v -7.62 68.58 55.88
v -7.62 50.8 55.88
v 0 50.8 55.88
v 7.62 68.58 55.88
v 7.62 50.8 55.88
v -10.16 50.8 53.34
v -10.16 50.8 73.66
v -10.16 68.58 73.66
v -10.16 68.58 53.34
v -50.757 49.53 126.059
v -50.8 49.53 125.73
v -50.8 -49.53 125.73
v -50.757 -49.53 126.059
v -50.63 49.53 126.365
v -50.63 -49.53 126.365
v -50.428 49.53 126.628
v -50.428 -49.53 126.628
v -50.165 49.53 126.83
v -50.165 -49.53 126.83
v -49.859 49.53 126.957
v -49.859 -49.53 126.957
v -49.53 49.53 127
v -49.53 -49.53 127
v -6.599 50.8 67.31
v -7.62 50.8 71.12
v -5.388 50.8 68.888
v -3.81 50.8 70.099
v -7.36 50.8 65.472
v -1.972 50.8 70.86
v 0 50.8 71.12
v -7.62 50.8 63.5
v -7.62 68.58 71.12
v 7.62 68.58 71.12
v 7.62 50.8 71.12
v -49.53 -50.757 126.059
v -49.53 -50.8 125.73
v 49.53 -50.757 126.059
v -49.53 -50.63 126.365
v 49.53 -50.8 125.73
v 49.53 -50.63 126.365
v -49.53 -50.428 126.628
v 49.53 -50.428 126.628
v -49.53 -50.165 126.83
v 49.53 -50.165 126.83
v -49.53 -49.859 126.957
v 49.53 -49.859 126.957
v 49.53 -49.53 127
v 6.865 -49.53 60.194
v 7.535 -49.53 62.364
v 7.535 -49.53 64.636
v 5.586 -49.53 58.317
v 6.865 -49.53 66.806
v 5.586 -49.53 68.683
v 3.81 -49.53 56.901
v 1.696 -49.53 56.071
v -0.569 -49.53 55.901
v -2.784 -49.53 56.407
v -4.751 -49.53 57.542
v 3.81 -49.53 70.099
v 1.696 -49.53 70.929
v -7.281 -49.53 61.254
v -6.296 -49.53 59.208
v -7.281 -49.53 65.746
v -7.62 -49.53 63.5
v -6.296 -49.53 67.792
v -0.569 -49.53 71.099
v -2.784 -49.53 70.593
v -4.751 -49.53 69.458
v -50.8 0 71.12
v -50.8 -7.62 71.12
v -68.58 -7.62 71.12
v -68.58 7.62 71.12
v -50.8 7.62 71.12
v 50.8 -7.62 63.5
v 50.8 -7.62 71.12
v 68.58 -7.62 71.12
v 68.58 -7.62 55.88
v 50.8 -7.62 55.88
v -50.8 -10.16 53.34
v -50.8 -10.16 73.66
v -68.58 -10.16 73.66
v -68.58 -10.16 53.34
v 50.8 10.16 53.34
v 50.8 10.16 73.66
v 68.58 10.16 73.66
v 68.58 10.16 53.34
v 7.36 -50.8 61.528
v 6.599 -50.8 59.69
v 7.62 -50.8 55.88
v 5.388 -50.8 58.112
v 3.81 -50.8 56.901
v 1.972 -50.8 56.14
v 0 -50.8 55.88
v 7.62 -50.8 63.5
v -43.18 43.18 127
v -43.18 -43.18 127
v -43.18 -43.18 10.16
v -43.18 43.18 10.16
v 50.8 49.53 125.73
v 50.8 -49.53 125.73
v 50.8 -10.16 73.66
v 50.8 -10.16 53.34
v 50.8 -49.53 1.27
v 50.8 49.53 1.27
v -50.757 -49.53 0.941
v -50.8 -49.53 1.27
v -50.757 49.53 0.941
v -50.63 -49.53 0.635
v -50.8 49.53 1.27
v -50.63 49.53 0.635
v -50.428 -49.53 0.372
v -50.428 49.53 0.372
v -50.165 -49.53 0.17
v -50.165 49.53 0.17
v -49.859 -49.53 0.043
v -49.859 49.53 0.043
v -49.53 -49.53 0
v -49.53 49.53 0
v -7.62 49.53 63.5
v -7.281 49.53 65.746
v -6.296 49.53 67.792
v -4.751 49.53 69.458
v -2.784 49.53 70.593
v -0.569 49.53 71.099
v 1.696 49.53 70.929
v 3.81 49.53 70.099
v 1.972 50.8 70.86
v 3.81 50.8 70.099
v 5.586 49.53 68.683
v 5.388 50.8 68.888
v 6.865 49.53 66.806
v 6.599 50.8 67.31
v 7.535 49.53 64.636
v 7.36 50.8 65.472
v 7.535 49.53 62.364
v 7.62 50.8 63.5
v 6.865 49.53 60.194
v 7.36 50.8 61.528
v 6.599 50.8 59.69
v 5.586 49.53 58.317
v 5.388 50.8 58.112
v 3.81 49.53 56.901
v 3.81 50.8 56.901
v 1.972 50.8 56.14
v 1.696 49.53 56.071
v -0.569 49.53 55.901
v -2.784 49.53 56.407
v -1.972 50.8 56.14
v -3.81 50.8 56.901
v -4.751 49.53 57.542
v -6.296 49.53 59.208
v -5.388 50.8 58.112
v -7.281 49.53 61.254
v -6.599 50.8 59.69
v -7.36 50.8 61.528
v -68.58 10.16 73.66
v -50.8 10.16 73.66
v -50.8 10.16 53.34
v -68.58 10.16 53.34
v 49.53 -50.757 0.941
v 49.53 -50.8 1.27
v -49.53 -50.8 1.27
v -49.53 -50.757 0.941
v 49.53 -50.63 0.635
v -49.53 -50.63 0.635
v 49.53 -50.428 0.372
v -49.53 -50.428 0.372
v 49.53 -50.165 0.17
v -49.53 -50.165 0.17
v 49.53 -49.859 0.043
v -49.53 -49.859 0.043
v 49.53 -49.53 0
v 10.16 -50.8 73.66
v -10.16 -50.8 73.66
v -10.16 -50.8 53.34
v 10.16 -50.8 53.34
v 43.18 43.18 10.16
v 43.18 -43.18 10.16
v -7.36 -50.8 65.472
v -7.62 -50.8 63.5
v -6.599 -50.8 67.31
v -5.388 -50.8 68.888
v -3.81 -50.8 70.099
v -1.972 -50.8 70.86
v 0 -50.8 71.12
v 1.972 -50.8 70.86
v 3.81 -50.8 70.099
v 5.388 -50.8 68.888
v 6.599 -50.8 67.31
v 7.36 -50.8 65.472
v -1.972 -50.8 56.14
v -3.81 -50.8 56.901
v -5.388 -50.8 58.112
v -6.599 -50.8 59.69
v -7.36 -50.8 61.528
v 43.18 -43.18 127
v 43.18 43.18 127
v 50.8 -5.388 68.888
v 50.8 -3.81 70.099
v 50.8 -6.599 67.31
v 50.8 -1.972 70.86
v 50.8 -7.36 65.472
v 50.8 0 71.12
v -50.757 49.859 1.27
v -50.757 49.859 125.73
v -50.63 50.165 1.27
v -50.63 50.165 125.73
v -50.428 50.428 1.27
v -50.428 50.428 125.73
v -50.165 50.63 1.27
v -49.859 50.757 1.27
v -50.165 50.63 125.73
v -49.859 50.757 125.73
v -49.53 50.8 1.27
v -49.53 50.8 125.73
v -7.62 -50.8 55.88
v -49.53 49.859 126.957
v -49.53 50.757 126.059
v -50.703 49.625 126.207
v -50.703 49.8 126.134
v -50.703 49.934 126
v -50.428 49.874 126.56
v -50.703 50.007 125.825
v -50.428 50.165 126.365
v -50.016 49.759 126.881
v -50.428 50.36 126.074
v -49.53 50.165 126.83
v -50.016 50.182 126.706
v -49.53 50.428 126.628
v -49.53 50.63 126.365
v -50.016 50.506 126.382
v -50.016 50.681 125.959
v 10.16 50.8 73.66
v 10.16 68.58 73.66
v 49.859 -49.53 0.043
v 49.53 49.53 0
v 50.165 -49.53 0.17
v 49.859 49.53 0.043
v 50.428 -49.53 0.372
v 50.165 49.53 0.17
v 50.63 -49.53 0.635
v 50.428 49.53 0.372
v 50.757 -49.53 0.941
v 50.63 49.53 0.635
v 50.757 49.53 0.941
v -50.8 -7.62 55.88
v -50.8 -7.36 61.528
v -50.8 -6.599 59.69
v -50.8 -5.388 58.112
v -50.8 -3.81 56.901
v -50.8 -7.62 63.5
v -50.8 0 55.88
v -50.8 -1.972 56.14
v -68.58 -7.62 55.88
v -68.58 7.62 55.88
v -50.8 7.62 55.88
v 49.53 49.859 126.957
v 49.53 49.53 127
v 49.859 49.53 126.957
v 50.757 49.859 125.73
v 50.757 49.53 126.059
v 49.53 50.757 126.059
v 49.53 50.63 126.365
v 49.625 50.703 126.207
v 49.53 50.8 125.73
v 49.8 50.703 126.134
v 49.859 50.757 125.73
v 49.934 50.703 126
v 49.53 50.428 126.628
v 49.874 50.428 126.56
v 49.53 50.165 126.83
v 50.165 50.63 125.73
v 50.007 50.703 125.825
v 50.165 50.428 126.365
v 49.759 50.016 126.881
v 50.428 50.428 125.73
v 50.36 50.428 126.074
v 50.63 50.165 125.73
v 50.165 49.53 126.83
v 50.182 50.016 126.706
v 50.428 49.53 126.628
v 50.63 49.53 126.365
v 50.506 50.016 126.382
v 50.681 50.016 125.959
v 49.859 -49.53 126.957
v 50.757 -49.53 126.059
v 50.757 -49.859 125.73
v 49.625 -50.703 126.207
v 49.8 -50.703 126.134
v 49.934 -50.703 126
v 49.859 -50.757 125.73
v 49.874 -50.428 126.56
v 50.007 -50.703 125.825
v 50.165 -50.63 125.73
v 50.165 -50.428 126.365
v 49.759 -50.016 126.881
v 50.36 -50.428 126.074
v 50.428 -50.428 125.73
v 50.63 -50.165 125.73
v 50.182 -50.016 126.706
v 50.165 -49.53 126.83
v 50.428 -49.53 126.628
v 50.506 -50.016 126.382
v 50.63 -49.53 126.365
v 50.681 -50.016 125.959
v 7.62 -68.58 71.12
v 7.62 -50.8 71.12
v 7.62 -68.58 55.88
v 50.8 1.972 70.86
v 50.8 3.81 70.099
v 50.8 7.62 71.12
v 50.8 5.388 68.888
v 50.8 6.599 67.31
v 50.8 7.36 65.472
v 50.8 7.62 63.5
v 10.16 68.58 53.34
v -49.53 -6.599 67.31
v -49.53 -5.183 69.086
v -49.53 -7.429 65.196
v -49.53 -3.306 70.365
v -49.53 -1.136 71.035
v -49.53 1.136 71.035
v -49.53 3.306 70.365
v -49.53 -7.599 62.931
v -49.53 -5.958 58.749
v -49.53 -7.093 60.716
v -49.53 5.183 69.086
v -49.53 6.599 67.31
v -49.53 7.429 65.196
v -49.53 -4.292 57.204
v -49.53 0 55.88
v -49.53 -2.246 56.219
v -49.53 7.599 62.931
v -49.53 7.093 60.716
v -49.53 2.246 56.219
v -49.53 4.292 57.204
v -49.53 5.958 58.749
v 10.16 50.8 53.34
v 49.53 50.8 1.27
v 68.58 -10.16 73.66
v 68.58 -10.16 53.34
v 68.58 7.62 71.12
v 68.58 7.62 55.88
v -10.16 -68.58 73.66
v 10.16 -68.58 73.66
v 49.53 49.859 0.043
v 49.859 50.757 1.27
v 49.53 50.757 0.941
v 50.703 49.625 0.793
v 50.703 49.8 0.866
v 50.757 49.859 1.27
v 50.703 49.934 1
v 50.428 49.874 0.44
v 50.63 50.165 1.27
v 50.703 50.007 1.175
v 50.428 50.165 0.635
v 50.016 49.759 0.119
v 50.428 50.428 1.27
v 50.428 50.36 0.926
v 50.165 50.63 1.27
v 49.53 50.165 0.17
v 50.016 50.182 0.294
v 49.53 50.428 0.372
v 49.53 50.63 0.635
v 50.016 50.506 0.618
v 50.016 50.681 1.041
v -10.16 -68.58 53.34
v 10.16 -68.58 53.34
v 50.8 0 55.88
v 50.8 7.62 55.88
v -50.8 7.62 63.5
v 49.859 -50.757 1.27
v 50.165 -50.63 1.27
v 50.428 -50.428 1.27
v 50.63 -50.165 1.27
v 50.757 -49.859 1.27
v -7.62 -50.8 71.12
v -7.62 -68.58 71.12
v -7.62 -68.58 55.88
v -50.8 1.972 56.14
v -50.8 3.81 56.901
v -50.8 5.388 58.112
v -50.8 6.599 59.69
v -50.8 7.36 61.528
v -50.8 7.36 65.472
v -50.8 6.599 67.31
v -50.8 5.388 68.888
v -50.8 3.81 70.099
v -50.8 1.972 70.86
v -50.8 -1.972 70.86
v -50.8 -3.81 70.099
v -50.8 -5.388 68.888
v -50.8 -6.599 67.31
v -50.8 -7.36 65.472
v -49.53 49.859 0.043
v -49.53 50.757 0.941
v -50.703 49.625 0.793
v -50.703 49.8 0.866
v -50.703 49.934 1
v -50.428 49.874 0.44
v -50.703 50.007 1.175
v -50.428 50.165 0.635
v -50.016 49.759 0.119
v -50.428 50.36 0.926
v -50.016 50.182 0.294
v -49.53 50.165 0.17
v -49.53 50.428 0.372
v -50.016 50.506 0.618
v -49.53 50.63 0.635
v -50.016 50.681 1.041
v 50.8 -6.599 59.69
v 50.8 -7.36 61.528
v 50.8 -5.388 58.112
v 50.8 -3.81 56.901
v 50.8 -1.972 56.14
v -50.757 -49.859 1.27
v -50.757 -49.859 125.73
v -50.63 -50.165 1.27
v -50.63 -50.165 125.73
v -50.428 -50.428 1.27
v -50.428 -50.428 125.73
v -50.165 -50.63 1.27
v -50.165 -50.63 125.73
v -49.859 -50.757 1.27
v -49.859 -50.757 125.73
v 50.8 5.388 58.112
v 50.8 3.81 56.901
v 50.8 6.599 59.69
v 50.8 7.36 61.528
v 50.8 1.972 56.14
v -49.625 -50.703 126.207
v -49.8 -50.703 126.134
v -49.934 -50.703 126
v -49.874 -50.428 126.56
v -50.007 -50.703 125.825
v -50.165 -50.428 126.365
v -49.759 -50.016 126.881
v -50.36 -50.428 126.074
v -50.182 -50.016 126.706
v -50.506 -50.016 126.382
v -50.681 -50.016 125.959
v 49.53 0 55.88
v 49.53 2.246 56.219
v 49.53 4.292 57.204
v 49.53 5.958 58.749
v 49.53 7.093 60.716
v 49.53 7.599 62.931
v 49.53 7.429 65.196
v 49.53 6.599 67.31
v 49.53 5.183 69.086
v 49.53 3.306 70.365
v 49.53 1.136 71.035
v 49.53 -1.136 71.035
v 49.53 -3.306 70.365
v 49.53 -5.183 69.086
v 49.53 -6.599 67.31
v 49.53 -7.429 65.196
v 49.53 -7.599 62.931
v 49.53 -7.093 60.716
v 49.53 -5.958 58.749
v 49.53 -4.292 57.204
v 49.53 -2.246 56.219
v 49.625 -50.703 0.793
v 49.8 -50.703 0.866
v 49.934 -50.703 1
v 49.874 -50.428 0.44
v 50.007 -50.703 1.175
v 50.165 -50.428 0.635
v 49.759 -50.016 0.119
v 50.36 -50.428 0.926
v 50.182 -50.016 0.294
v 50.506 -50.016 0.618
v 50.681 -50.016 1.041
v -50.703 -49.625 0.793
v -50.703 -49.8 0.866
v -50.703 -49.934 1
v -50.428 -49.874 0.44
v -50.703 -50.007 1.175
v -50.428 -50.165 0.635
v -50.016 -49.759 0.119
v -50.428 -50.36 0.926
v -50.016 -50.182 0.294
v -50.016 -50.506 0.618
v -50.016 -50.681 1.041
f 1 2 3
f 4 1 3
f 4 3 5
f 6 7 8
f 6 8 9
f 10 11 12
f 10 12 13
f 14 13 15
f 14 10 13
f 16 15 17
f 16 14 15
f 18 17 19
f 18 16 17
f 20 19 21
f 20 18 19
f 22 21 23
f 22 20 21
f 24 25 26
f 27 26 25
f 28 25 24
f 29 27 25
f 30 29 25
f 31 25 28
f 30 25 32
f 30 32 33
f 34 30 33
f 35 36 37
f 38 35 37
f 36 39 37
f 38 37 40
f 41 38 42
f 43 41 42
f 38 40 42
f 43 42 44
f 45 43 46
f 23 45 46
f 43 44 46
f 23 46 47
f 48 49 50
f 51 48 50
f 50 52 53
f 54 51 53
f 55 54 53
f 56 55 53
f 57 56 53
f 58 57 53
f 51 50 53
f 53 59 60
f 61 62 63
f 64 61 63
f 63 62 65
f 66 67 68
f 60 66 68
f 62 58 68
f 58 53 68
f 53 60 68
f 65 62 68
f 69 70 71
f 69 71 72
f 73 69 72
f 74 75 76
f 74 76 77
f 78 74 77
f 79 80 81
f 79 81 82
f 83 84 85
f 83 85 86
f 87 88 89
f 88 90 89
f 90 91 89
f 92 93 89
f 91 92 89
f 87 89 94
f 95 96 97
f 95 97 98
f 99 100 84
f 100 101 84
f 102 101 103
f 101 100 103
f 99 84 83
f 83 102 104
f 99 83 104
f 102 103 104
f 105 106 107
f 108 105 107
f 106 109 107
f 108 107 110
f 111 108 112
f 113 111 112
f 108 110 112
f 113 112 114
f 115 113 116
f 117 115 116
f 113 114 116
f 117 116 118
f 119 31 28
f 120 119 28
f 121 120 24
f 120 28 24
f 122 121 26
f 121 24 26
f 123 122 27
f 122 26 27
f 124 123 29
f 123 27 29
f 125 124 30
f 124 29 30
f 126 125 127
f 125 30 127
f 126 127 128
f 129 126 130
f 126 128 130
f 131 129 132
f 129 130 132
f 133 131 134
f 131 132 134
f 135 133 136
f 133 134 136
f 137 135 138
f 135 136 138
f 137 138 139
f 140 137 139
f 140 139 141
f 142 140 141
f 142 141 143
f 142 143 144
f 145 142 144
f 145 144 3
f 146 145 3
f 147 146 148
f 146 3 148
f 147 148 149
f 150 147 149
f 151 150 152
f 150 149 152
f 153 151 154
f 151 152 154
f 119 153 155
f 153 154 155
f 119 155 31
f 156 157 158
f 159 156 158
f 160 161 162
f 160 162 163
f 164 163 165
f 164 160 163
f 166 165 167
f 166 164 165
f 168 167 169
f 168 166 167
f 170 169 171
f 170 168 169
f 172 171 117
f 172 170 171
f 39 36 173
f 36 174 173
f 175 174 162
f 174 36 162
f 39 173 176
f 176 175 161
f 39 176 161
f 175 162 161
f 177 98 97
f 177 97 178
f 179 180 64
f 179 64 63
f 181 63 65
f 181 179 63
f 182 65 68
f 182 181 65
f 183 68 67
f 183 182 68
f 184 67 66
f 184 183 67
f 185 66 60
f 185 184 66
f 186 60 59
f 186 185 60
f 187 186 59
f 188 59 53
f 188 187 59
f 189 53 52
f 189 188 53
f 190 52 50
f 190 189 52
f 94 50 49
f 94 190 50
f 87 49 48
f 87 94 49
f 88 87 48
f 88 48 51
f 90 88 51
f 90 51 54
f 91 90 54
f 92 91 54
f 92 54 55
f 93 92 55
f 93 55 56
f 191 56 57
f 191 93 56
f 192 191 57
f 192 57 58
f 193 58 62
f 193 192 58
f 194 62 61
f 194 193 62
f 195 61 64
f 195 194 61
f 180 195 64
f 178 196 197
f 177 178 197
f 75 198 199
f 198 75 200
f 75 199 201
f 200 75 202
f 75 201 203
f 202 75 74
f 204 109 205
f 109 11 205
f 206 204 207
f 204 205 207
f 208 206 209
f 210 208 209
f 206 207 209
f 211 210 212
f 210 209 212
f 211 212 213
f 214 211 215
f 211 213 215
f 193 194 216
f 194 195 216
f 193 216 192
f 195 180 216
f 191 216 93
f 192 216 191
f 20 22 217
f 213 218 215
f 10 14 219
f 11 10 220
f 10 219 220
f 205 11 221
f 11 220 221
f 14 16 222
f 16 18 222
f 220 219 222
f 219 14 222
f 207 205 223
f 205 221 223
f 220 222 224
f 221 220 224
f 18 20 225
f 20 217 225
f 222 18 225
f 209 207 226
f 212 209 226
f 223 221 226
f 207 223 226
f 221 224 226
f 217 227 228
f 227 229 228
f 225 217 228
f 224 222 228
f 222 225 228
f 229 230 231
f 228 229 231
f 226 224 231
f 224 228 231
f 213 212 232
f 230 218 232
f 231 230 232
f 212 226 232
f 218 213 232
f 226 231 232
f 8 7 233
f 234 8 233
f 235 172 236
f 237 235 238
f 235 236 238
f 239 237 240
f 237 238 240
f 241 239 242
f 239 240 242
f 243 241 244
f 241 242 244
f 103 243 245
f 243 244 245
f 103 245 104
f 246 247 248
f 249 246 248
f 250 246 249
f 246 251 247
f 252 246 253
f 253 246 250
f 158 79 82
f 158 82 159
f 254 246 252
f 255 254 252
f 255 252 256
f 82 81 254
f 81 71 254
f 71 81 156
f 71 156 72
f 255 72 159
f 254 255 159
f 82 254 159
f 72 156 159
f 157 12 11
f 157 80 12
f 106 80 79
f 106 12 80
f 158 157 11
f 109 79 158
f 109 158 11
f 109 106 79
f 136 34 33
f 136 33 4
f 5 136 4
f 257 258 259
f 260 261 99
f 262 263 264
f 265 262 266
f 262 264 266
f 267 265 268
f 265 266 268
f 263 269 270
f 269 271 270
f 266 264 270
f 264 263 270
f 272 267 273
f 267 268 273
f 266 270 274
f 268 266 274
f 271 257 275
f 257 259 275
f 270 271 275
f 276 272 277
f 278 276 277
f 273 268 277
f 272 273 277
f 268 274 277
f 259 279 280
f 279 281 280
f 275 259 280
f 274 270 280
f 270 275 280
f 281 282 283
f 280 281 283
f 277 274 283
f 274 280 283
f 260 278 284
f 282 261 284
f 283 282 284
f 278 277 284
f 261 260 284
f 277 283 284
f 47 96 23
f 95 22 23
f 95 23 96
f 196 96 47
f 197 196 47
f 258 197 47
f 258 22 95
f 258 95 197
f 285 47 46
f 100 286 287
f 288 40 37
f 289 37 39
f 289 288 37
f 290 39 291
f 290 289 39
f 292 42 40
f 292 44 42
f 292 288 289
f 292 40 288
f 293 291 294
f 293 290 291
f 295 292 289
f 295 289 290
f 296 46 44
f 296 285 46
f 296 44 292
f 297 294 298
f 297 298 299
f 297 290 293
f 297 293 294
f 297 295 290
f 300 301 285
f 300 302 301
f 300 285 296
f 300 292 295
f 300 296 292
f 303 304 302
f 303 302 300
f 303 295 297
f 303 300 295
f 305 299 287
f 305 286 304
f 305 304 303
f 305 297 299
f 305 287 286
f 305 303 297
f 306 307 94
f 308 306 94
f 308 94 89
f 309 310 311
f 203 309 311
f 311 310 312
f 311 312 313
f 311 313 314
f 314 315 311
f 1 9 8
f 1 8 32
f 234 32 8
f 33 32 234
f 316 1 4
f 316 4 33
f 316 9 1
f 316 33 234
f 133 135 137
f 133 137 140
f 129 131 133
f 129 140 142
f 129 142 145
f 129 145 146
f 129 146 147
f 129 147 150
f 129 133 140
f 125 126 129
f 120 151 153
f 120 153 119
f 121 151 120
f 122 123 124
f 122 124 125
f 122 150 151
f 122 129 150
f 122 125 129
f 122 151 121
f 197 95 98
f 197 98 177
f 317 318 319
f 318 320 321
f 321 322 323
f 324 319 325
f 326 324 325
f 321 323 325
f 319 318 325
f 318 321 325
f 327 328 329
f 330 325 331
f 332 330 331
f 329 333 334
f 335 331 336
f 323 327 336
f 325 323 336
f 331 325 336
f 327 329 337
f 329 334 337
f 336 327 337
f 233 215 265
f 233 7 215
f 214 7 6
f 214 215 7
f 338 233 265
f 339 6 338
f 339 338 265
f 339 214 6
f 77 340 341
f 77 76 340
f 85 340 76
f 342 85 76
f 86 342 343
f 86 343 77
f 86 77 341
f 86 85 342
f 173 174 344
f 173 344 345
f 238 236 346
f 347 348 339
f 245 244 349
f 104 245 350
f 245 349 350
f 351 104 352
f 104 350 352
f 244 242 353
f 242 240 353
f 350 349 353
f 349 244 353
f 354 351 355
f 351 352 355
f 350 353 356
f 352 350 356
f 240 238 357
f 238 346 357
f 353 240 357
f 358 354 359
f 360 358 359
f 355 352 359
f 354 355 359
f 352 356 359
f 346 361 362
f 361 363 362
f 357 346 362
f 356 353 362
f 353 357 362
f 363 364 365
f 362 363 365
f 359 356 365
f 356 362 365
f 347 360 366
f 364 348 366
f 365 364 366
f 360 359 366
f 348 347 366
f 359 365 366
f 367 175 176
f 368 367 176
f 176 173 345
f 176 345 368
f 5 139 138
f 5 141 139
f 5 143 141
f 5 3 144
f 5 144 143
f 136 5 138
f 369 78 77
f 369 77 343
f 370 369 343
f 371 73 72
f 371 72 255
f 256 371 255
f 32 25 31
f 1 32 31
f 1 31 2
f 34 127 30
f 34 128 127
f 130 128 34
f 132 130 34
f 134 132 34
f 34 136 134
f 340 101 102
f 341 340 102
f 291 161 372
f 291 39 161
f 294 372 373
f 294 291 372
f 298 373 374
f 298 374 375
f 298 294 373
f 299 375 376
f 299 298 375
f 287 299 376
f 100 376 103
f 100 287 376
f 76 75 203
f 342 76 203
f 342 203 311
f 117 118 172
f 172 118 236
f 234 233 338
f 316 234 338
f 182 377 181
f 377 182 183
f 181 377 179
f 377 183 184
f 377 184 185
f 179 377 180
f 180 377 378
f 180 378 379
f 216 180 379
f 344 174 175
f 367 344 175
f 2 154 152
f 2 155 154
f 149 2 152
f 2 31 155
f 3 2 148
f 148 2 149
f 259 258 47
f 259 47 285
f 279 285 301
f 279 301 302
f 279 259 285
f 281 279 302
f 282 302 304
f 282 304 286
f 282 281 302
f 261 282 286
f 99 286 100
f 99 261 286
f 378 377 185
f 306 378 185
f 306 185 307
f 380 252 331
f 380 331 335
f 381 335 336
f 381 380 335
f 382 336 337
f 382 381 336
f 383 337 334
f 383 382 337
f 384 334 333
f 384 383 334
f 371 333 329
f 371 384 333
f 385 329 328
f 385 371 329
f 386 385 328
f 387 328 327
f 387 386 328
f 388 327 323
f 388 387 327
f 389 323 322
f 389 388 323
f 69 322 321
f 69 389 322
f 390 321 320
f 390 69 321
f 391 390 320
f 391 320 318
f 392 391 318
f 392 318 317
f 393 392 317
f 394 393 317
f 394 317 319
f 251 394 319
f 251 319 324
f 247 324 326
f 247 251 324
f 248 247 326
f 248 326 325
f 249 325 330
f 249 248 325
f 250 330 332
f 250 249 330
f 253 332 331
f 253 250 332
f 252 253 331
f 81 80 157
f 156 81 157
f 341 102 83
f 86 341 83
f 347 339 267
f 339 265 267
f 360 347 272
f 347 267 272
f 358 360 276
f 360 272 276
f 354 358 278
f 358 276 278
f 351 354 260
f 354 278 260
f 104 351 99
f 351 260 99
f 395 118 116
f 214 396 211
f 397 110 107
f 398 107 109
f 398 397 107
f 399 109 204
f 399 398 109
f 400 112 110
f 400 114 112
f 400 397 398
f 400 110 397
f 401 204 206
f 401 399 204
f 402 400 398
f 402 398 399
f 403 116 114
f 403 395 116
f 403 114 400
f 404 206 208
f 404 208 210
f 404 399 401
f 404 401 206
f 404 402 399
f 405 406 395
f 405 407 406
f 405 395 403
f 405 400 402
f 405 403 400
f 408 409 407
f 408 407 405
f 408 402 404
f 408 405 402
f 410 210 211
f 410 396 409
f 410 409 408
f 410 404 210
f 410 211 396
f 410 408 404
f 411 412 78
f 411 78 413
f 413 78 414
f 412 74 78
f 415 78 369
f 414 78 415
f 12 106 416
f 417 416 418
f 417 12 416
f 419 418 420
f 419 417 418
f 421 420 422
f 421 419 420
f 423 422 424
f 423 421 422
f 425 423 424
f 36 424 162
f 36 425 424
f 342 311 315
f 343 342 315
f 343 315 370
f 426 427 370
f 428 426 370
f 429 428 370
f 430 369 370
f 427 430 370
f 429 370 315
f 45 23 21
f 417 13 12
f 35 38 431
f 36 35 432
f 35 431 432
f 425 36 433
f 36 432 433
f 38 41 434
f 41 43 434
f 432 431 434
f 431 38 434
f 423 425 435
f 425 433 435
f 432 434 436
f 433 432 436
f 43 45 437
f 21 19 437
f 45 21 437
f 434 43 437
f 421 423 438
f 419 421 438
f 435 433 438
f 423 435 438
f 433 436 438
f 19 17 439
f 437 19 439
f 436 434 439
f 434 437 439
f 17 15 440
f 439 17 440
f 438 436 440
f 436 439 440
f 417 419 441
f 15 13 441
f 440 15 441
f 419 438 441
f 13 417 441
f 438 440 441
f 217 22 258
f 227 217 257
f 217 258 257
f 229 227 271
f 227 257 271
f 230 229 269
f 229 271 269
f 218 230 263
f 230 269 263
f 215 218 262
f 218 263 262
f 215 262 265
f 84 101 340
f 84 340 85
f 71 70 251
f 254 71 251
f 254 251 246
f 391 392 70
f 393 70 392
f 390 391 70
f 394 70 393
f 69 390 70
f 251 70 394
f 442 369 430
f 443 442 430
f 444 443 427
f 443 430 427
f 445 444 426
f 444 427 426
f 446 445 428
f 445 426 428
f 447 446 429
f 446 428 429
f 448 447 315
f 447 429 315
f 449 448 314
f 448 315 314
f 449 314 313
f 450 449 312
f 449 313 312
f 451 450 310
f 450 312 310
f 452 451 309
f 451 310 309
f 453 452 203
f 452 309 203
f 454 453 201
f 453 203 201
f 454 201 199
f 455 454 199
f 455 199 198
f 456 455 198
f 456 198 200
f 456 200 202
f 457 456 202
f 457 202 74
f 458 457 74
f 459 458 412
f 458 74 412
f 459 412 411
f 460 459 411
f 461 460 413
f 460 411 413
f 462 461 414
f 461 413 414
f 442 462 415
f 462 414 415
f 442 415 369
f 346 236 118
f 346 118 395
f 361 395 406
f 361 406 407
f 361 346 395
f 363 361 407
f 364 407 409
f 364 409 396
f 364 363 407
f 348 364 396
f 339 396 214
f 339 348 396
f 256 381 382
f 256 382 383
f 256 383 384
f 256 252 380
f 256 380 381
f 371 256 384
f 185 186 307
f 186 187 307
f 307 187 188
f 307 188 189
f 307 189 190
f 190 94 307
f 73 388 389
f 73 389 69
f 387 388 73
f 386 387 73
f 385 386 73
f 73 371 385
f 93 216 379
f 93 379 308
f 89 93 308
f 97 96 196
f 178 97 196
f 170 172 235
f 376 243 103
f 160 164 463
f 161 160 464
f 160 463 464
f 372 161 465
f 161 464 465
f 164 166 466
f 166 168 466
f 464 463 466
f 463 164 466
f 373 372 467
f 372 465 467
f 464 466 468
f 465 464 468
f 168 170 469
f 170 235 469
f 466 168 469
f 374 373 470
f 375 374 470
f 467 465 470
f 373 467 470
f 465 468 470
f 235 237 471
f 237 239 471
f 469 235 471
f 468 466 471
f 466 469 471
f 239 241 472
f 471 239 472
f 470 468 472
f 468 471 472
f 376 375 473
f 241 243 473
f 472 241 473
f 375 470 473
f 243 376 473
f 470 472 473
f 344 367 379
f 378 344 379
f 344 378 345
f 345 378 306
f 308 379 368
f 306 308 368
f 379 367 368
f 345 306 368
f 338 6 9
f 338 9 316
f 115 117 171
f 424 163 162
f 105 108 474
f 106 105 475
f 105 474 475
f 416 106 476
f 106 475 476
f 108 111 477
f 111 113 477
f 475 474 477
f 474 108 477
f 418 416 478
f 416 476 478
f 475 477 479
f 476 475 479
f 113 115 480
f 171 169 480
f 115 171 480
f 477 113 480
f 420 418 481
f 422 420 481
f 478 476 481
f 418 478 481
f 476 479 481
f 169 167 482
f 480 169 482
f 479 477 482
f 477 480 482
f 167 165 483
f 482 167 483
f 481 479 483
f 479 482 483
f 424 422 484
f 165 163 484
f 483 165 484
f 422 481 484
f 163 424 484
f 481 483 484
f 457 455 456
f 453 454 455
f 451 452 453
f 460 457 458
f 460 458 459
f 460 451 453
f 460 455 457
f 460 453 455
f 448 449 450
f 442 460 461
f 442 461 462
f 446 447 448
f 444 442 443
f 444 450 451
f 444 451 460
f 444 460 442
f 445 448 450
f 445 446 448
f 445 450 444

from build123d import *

# Parameters (mm, degrees)
SKETCH1_W           = 101.6
SKETCH1_H           = 101.6
BOSS_EXTRUDE1_DEPTH = 127
SKETCH2_W           = 86.36
SKETCH2_H           = 86.36
CUT_EXTRUDE1_DEPTH  = 116.84
SKETCH4_W           = 20.32
SKETCH4_H           = 20.32
SKETCH4_W_2         = 15.24
SKETCH4_H_2         = 15.24
BOSS_EXTRUDE2_DEPTH = 17.78
SKETCH6_R           = 7.62
CUT_EXTRUDE2_DEPTH  = 1.27
SKETCH7_W           = 20.32
SKETCH7_H           = 20.32
SKETCH7_W_2         = 15.24
SKETCH7_H_2         = 15.24
BOSS_EXTRUDE3_DEPTH = 17.78
SKETCH9_R           = 7.62
CUT_EXTRUDE3_DEPTH  = 1.27
FILLET1_R           = 1.27


with BuildPart() as part:
    # Sketch1 → Boss-Extrude1 (new body)
    with BuildSketch(Plane.XY):
        Rectangle(SKETCH1_W, SKETCH1_H)
    extrude(amount=BOSS_EXTRUDE1_DEPTH)

    # Sketch2 → Cut-Extrude1 (cut)
    with BuildSketch(Plane.XY.offset(127)):
        Rectangle(SKETCH2_W, SKETCH2_H)
    extrude(amount=-CUT_EXTRUDE1_DEPTH, mode=Mode.SUBTRACT)

    # Sketch4 → Boss-Extrude2 (add)
    with BuildSketch(Plane(origin=(0, 50.8, 0), x_dir=(1, 0, 0), z_dir=(0, 1, 0))):
        with Locations((0, -63.5)):
            Rectangle(SKETCH4_W, SKETCH4_H)
        with Locations((0, -63.5)):
            Rectangle(SKETCH4_W_2, SKETCH4_H_2, mode=Mode.SUBTRACT)
    boss_extrude2 = extrude(amount=BOSS_EXTRUDE2_DEPTH)

    # Sketch6 → Cut-Extrude2 (cut)
    with BuildSketch(Plane(origin=(0, 50.8, 0), x_dir=(1, 0, 0), z_dir=(0, 1, 0))):
        with Locations(Location((0, -63.5, 0), (0, 0, 180))):
            Circle(SKETCH6_R)
    cut_extrude2 = extrude(amount=-CUT_EXTRUDE2_DEPTH, mode=Mode.SUBTRACT)

    # Mirror1: Boss-Extrude2, Cut-Extrude2 across plane
    add(boss_extrude2.mirror(Plane.ZX))
    add(cut_extrude2.mirror(Plane.ZX), mode=Mode.SUBTRACT)

    # Sketch7 → Boss-Extrude3 (add)
    with BuildSketch(Plane(origin=(50.8, 0, 0), x_dir=(0, 0, -1), z_dir=(1, 0, 0))):
        with Locations((-63.5, 0)):
            Rectangle(SKETCH7_W, SKETCH7_H)
        with Locations((-63.5, 0)):
            Rectangle(SKETCH7_W_2, SKETCH7_H_2, mode=Mode.SUBTRACT)
    boss_extrude3 = extrude(amount=BOSS_EXTRUDE3_DEPTH)

    # Sketch9 → Cut-Extrude3 (cut)
    with BuildSketch(Plane(origin=(50.8, 0, 0), x_dir=(0, 0, -1), z_dir=(1, 0, 0))):
        with Locations((-63.5, 0)):
            Circle(SKETCH9_R)
    cut_extrude3 = extrude(amount=-CUT_EXTRUDE3_DEPTH, mode=Mode.SUBTRACT)

    # Mirror2: Boss-Extrude3, Cut-Extrude3 across plane
    add(boss_extrude3.mirror(Plane(origin=(0, 0, 0), x_dir=(0, 0, 1), z_dir=(1, 0, 0))))
    add(cut_extrude3.mirror(Plane(origin=(0, 0, 0), x_dir=(0, 0, 1), z_dir=(1, 0, 0))), mode=Mode.SUBTRACT)

    # Fillet1
    fillet1_edges = [part.edges().sort_by_distance(p)[0] for p in [
        (50.8, 0, 127),
        (0, 50.8, 127),
        (-50.8, 0, 127),
        (0, 50.8, 0),
        (50.8, 0, 0),
        (0, -50.8, 0),
        (-50.8, 0, 0),
        (0, -50.8, 127),
        (-50.8, 50.8, 63.5),
        (50.8, 50.8, 63.5),
        (50.8, -50.8, 63.5),
        (-50.8, -50.8, 63.5),
    ]]
    fillet(fillet1_edges, radius=FILLET1_R)


solid = part.part
